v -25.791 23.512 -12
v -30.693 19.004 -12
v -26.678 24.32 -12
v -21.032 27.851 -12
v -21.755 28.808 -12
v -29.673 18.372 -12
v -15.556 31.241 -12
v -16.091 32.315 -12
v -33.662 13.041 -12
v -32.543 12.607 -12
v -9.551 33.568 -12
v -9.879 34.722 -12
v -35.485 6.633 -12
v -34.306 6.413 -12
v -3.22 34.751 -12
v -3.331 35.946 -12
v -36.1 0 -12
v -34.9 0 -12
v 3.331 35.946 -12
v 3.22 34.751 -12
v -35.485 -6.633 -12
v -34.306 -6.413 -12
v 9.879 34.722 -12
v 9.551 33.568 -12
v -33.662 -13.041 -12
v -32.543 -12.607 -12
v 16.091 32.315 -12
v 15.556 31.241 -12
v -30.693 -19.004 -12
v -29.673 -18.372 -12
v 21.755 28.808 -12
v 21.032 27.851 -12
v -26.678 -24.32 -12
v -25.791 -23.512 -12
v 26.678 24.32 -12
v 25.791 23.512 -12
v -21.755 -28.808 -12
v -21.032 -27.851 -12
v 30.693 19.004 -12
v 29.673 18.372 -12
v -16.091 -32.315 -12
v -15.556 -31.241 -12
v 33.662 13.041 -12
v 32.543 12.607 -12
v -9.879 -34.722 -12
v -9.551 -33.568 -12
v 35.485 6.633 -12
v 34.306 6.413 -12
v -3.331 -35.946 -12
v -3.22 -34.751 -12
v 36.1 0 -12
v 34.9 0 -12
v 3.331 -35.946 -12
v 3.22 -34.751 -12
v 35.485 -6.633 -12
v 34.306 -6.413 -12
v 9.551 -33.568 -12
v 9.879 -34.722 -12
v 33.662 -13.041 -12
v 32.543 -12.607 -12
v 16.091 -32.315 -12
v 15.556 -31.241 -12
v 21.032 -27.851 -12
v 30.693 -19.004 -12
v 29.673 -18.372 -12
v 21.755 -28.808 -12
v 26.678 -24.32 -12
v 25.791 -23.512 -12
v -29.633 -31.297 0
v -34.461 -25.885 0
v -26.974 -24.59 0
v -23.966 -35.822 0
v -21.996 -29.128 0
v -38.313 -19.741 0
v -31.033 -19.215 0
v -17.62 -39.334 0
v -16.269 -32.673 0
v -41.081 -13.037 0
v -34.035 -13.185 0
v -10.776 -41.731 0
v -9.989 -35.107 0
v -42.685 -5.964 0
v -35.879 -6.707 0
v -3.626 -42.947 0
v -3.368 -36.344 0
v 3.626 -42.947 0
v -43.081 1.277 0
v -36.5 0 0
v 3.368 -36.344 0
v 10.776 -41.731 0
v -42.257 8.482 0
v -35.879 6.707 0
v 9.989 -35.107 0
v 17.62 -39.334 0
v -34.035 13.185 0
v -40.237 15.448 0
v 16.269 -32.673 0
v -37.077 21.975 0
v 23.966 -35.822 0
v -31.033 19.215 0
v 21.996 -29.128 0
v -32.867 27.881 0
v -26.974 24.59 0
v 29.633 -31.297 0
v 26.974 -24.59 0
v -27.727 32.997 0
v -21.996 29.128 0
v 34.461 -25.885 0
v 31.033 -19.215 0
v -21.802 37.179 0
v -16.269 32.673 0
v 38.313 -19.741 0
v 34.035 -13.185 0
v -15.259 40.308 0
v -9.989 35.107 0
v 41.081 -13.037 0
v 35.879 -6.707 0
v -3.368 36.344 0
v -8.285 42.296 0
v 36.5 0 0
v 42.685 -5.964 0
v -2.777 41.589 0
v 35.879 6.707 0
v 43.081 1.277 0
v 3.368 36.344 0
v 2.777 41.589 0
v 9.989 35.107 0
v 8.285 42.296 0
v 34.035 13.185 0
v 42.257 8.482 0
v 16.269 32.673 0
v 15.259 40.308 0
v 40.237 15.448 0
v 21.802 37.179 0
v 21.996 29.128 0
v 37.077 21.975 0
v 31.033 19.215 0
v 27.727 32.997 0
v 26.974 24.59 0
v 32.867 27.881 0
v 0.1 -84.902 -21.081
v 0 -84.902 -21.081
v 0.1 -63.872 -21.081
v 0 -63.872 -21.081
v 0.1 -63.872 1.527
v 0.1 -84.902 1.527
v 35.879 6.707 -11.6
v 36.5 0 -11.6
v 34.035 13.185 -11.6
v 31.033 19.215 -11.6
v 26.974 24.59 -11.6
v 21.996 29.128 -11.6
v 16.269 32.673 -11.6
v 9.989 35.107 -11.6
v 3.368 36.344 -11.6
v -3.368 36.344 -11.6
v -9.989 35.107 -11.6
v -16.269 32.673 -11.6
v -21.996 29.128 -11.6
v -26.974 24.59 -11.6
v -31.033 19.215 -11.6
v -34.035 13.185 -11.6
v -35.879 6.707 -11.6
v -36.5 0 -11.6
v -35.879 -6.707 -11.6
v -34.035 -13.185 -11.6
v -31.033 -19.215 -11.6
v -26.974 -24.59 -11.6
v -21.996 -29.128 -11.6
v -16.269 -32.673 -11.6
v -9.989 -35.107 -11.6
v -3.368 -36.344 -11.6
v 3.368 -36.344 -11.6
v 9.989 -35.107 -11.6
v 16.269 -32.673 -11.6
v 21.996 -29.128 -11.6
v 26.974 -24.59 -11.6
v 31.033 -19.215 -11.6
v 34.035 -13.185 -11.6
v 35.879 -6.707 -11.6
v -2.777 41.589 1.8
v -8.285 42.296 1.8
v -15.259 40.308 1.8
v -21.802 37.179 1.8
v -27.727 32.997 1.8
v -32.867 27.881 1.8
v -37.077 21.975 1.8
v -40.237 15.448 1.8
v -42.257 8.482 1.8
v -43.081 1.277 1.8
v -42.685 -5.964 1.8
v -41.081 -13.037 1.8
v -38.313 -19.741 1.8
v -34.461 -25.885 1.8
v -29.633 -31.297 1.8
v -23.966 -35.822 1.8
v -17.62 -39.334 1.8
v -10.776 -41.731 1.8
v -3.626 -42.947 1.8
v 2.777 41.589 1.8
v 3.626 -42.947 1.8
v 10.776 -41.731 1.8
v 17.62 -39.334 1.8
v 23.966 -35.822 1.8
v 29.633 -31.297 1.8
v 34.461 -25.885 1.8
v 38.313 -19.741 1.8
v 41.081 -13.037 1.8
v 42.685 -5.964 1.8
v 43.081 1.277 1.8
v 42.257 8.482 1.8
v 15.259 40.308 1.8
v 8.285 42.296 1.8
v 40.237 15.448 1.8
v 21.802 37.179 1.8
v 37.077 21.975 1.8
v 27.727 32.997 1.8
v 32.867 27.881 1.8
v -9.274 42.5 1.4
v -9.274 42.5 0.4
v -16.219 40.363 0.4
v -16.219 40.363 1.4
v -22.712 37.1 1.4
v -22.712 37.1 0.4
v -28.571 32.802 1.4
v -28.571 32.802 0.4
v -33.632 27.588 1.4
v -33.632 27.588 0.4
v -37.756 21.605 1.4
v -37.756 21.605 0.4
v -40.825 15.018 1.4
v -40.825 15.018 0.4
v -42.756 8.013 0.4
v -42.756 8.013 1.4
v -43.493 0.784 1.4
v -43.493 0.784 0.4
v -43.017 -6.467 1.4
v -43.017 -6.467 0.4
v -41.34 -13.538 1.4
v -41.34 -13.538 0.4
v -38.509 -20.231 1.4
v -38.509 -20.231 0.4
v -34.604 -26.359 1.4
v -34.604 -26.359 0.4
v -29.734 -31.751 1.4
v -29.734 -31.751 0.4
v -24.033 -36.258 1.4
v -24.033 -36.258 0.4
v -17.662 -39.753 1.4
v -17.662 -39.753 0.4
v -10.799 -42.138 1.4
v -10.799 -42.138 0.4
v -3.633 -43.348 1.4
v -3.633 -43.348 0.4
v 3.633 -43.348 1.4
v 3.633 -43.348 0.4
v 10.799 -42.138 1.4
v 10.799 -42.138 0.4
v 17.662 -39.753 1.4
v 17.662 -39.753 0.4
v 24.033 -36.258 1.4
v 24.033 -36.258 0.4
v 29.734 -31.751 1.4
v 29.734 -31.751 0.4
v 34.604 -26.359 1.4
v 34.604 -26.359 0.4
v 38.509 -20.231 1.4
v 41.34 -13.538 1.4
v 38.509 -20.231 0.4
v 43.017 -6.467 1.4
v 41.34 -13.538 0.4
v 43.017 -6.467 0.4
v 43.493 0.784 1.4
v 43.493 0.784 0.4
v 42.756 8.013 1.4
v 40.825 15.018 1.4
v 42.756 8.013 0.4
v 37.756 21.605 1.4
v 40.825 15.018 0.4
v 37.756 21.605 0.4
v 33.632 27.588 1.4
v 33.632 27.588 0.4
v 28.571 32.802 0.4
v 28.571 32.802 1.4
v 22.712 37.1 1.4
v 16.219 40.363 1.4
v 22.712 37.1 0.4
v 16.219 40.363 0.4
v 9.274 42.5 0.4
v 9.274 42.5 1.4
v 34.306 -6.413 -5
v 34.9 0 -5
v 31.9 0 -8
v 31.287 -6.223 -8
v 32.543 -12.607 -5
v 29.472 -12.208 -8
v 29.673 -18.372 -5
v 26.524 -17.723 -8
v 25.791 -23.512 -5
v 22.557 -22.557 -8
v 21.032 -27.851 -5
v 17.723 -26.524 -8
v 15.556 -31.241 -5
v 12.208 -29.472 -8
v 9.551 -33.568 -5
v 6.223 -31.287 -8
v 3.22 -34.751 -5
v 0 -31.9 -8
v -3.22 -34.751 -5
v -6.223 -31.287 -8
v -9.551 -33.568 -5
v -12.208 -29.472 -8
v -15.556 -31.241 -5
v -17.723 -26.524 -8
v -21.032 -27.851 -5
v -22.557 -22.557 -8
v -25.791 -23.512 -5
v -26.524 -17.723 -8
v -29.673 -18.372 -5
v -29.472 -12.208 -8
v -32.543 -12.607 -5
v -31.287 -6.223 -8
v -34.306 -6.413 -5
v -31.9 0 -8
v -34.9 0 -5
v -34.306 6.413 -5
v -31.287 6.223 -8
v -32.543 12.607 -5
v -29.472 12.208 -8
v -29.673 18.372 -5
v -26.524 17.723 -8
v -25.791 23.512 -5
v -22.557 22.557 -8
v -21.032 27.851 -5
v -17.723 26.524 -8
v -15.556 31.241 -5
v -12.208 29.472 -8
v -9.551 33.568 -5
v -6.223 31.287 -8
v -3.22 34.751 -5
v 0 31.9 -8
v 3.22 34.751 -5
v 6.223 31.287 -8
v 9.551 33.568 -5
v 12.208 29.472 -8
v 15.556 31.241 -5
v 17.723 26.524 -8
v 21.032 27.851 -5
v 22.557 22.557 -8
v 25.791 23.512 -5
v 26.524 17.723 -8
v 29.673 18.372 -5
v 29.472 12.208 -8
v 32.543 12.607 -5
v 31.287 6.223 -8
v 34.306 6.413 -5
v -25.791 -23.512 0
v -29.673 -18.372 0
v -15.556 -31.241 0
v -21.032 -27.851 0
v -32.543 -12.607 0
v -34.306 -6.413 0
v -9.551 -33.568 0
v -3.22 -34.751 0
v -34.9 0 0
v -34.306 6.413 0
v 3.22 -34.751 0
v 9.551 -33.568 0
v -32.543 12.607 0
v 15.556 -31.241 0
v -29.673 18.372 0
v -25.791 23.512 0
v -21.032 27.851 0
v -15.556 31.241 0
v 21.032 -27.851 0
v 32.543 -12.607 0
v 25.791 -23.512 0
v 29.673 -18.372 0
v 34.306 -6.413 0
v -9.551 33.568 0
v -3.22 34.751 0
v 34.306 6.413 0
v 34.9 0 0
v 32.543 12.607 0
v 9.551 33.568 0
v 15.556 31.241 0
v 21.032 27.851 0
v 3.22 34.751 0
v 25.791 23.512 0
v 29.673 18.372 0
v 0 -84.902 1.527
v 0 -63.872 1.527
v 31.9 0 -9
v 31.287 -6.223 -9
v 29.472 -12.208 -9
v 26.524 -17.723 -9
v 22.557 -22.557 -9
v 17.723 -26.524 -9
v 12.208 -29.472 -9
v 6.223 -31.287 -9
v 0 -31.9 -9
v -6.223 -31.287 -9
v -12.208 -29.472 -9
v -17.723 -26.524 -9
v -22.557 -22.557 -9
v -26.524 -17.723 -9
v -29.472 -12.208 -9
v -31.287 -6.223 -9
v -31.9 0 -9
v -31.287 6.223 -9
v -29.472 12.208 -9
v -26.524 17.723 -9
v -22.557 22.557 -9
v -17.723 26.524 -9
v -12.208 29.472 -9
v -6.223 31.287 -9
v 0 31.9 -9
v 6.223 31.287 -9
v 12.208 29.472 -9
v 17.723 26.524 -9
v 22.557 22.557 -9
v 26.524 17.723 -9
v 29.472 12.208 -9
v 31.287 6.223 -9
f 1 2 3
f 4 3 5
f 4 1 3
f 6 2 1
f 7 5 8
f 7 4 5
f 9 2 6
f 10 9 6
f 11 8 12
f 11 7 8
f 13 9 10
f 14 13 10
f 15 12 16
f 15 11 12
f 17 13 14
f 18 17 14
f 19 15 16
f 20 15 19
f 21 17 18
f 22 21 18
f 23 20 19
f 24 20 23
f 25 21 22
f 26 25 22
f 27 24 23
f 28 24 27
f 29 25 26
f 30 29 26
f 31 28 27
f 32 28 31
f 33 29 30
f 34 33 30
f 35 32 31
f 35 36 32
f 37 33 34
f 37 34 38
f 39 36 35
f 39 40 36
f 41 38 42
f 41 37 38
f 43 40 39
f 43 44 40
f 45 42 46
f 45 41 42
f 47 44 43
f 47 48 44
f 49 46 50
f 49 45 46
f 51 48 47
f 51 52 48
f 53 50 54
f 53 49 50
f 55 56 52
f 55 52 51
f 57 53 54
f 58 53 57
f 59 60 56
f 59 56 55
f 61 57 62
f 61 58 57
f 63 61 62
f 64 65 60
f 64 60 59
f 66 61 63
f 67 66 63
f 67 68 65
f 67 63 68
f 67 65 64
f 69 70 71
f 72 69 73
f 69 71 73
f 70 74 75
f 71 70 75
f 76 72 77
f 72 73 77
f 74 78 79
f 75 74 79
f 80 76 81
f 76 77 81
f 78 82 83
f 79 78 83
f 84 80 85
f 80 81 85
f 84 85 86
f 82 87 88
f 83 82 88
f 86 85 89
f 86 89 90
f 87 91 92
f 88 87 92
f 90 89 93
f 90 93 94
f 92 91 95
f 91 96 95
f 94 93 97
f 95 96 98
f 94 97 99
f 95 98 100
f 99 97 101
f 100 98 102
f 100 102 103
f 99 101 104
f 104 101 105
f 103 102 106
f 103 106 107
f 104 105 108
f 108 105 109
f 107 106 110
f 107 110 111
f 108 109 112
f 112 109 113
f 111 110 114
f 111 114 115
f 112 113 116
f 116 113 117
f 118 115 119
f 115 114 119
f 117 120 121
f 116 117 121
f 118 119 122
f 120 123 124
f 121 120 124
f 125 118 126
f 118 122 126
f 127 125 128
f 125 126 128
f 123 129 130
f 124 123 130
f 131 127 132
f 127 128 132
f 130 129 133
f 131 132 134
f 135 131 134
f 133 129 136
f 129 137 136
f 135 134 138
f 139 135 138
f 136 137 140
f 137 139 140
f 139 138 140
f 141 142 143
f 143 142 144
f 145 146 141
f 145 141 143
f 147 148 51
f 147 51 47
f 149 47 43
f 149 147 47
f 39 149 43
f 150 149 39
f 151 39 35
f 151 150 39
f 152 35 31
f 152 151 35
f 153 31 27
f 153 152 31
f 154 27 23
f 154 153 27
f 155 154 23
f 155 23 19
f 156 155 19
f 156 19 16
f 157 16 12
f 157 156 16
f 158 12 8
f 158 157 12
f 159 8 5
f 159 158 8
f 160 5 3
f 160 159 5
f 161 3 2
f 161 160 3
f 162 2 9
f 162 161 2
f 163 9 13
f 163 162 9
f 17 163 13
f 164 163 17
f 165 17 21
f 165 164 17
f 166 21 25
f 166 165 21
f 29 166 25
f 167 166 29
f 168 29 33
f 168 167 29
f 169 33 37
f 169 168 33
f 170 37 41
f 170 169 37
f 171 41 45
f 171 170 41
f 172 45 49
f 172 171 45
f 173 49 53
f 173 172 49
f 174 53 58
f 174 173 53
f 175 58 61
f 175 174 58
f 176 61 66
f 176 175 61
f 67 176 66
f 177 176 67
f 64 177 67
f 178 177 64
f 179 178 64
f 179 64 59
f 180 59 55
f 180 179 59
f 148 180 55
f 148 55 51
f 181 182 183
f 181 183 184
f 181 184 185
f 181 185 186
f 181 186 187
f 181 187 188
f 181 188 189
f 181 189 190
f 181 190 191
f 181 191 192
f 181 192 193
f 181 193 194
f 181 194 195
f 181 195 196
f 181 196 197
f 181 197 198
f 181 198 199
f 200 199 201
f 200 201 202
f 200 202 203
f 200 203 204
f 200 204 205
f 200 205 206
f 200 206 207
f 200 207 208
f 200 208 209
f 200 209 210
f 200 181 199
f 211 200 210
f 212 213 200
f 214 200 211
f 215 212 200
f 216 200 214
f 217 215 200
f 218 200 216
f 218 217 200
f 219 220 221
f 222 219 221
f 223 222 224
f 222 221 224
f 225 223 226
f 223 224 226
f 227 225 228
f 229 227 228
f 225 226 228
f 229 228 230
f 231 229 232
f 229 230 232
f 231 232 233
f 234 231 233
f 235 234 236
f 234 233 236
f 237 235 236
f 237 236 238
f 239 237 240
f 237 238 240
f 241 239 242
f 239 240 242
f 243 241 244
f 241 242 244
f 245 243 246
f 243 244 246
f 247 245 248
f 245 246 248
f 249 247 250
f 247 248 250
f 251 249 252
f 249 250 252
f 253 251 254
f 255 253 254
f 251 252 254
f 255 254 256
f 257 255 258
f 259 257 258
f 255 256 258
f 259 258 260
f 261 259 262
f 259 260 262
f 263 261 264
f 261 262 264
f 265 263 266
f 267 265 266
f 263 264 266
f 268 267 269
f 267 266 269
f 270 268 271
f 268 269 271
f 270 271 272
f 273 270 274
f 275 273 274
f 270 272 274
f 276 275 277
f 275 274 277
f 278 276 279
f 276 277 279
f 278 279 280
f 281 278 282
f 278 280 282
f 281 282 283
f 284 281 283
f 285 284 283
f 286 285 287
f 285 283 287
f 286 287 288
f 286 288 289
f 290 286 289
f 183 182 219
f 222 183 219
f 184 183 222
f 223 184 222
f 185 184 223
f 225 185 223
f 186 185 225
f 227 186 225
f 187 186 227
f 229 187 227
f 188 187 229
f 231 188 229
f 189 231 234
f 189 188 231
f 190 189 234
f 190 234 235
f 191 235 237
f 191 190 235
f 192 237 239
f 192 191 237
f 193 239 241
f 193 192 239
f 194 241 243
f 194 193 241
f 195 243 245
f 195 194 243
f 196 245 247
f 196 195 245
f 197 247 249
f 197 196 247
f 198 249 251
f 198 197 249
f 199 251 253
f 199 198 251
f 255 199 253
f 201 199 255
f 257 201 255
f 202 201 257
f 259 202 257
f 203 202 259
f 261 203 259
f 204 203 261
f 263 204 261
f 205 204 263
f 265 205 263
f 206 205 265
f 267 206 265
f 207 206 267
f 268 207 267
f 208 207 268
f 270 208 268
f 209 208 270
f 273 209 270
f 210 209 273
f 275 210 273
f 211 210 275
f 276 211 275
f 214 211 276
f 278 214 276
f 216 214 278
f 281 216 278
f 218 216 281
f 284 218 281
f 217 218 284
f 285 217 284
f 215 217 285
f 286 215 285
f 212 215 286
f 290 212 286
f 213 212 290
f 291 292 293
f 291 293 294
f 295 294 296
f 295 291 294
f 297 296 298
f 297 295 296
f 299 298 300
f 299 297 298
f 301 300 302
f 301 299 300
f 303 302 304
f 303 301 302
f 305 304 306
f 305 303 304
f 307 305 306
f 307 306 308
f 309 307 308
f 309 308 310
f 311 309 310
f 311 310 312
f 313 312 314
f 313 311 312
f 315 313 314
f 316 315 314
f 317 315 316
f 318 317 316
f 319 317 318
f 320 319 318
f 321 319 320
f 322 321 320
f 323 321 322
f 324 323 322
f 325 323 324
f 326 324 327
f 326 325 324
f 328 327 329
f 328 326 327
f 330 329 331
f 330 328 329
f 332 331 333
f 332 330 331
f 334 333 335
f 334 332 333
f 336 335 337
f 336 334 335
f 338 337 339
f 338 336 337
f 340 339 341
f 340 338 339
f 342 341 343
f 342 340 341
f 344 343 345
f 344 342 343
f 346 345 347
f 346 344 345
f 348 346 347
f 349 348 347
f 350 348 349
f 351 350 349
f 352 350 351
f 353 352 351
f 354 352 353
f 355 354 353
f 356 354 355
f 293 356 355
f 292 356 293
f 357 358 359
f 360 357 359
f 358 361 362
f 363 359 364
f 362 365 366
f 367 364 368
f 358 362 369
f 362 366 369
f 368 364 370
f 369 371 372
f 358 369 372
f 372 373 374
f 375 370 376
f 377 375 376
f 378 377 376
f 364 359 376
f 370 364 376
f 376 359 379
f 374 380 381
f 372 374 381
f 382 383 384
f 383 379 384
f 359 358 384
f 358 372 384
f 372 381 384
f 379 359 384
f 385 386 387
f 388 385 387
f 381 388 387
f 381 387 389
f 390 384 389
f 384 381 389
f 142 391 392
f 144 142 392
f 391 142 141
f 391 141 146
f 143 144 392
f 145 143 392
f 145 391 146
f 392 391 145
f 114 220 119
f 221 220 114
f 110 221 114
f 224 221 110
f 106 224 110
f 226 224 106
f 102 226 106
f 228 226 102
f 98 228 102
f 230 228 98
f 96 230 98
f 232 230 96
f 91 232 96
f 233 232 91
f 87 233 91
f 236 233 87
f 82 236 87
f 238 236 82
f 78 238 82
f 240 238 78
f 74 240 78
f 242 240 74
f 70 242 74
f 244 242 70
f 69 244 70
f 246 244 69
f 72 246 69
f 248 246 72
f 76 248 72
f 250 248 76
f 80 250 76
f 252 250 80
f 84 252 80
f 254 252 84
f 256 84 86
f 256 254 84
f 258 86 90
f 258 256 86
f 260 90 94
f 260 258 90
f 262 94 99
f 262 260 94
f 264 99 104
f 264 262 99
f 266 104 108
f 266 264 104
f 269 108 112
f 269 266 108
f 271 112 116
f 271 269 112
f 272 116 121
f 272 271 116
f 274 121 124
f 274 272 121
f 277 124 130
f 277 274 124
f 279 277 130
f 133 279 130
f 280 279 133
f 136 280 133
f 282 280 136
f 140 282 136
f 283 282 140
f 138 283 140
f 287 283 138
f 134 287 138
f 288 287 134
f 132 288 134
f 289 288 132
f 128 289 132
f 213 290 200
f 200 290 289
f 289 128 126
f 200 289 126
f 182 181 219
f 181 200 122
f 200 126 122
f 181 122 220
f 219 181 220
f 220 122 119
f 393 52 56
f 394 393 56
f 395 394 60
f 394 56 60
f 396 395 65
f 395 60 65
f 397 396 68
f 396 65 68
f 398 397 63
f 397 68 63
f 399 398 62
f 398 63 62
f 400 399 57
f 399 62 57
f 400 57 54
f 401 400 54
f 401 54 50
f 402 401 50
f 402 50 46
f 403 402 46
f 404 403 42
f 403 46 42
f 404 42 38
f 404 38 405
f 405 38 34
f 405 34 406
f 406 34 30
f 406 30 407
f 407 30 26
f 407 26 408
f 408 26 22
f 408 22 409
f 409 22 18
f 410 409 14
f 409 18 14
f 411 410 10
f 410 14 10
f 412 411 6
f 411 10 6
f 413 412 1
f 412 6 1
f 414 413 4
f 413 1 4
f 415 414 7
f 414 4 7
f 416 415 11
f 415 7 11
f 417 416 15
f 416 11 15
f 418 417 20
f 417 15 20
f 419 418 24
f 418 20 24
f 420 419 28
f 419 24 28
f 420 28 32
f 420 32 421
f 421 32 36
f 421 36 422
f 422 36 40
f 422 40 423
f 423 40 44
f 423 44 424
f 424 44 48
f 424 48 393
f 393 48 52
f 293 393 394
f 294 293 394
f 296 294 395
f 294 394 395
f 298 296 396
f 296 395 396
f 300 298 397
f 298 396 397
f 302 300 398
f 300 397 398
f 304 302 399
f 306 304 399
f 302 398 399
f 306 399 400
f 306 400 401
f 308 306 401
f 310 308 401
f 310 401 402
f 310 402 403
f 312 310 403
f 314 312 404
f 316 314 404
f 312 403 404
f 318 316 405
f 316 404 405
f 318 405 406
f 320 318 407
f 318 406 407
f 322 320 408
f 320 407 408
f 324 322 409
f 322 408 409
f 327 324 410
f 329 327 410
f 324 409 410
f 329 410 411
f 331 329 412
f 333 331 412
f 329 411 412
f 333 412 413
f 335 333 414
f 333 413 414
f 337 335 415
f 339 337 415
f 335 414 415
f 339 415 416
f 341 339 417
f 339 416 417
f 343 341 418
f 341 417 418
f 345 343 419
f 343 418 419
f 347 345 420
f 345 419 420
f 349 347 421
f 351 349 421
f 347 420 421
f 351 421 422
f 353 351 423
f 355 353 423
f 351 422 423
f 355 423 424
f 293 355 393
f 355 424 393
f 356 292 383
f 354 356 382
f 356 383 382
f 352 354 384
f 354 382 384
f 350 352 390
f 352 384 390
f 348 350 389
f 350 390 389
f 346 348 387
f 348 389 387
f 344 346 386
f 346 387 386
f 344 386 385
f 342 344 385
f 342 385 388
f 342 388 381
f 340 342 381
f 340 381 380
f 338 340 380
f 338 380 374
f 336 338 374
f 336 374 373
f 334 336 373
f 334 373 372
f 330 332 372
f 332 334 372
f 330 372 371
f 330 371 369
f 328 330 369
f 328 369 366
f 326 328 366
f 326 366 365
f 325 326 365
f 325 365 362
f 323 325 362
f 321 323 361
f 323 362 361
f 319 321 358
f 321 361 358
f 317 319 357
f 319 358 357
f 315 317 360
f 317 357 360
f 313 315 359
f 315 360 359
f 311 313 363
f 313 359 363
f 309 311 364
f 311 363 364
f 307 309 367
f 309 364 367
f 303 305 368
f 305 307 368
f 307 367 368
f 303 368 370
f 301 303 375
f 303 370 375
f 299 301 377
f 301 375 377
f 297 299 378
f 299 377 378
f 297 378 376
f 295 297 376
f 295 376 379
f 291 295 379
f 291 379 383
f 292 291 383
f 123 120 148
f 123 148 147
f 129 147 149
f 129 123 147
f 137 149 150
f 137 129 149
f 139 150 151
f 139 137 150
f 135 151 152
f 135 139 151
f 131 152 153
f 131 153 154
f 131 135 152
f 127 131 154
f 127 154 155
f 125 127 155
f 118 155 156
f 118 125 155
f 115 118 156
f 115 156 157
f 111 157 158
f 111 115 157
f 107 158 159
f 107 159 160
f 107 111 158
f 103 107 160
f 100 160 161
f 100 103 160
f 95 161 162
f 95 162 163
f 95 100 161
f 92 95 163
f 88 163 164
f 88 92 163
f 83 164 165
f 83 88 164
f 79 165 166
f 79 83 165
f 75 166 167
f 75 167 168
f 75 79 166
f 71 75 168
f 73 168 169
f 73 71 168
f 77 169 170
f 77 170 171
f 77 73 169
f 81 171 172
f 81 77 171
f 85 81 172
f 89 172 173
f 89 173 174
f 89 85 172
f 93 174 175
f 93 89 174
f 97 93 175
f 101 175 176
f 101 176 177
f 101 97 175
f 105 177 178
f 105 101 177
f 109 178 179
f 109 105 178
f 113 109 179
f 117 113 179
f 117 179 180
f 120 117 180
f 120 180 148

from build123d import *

# Parameters (mm, degrees)
F0_R     = 36.5
F0_R_2   = 34.9
F1_DEPTH = 1.8
F2_DEPTH = 12
F3_R     = 34.9
F3_R_2   = 31.9
F4_DEPTH = 7
F5_SIZE  = 2.99999
F6_W     = 21.030202508
F6_H     = 22.6074543316
F7_DEPTH = 0.1
F8_SIZE  = 0.4


# Not quite as in the source:
# - a fillet or chamfer is up to 0.001 mm smaller than in the source, because OpenCascade refuses the exact size


with BuildPart() as f1:
    # F0 (on Top) → F1 (new body)
    with BuildSketch(Plane.XY):
        with BuildLine():
            ThreePointArc((-9.2736184955, 42.5), (-27.2841308772, -33.8795838563), (43.5, 0))
            ThreePointArc((43.5, 0), (33.8795838563, 27.2841308772), (9.2736184955, 42.5))
            ThreePointArc((9.2736184955, 42.5), (0, 41.5), (-9.2736184955, 42.5))
        make_face()
        Circle(F0_R, mode=Mode.SUBTRACT)
        Circle(F0_R)
        Circle(F0_R_2, mode=Mode.SUBTRACT)
        Circle(F0_R_2)
    extrude(amount=F1_DEPTH)

    # F0 (on Top) → F2 (join)
    with BuildSketch(Plane.XY):
        Circle(F0_R)
        Circle(F0_R_2, mode=Mode.SUBTRACT)
    extrude(amount=-F2_DEPTH)

    # F3 (on face) → F4 (join)
    with BuildSketch(Plane(origin=(0, 0, -12), x_dir=(1, 0, 0), z_dir=(0, 0, -1))):
        Circle(F3_R)
        Circle(F3_R_2, mode=Mode.SUBTRACT)
    extrude(amount=-F4_DEPTH)

    # F5 (size 3 in the source; OpenCascade refuses exactly that, so slightly less here)
    f5_edges = [f1.edges().sort_by_distance(p)[0] for p in [
        (-31.9, 0, -12),
        (-31.9, 0, -5),
    ]]
    chamfer(f5_edges, length=F5_SIZE)

    # F8
    f8_edges = [f1.edges().sort_by_distance(p)[0] for p in [
        (0, -43.5, 1.8),
        (-36.5, 0, -12),
        (0, -43.5, 0),
    ]]
    chamfer(f8_edges, length=F8_SIZE)


with BuildPart() as f7:
    # F6 (on Right) → F7 (new body)
    with BuildSketch(Plane.YZ):
        with Locations((-74.3868201971, -9.776847437)):
            Rectangle(F6_W, F6_H)
    extrude(amount=F7_DEPTH)


solid = Compound([f1.part, f7.part])
